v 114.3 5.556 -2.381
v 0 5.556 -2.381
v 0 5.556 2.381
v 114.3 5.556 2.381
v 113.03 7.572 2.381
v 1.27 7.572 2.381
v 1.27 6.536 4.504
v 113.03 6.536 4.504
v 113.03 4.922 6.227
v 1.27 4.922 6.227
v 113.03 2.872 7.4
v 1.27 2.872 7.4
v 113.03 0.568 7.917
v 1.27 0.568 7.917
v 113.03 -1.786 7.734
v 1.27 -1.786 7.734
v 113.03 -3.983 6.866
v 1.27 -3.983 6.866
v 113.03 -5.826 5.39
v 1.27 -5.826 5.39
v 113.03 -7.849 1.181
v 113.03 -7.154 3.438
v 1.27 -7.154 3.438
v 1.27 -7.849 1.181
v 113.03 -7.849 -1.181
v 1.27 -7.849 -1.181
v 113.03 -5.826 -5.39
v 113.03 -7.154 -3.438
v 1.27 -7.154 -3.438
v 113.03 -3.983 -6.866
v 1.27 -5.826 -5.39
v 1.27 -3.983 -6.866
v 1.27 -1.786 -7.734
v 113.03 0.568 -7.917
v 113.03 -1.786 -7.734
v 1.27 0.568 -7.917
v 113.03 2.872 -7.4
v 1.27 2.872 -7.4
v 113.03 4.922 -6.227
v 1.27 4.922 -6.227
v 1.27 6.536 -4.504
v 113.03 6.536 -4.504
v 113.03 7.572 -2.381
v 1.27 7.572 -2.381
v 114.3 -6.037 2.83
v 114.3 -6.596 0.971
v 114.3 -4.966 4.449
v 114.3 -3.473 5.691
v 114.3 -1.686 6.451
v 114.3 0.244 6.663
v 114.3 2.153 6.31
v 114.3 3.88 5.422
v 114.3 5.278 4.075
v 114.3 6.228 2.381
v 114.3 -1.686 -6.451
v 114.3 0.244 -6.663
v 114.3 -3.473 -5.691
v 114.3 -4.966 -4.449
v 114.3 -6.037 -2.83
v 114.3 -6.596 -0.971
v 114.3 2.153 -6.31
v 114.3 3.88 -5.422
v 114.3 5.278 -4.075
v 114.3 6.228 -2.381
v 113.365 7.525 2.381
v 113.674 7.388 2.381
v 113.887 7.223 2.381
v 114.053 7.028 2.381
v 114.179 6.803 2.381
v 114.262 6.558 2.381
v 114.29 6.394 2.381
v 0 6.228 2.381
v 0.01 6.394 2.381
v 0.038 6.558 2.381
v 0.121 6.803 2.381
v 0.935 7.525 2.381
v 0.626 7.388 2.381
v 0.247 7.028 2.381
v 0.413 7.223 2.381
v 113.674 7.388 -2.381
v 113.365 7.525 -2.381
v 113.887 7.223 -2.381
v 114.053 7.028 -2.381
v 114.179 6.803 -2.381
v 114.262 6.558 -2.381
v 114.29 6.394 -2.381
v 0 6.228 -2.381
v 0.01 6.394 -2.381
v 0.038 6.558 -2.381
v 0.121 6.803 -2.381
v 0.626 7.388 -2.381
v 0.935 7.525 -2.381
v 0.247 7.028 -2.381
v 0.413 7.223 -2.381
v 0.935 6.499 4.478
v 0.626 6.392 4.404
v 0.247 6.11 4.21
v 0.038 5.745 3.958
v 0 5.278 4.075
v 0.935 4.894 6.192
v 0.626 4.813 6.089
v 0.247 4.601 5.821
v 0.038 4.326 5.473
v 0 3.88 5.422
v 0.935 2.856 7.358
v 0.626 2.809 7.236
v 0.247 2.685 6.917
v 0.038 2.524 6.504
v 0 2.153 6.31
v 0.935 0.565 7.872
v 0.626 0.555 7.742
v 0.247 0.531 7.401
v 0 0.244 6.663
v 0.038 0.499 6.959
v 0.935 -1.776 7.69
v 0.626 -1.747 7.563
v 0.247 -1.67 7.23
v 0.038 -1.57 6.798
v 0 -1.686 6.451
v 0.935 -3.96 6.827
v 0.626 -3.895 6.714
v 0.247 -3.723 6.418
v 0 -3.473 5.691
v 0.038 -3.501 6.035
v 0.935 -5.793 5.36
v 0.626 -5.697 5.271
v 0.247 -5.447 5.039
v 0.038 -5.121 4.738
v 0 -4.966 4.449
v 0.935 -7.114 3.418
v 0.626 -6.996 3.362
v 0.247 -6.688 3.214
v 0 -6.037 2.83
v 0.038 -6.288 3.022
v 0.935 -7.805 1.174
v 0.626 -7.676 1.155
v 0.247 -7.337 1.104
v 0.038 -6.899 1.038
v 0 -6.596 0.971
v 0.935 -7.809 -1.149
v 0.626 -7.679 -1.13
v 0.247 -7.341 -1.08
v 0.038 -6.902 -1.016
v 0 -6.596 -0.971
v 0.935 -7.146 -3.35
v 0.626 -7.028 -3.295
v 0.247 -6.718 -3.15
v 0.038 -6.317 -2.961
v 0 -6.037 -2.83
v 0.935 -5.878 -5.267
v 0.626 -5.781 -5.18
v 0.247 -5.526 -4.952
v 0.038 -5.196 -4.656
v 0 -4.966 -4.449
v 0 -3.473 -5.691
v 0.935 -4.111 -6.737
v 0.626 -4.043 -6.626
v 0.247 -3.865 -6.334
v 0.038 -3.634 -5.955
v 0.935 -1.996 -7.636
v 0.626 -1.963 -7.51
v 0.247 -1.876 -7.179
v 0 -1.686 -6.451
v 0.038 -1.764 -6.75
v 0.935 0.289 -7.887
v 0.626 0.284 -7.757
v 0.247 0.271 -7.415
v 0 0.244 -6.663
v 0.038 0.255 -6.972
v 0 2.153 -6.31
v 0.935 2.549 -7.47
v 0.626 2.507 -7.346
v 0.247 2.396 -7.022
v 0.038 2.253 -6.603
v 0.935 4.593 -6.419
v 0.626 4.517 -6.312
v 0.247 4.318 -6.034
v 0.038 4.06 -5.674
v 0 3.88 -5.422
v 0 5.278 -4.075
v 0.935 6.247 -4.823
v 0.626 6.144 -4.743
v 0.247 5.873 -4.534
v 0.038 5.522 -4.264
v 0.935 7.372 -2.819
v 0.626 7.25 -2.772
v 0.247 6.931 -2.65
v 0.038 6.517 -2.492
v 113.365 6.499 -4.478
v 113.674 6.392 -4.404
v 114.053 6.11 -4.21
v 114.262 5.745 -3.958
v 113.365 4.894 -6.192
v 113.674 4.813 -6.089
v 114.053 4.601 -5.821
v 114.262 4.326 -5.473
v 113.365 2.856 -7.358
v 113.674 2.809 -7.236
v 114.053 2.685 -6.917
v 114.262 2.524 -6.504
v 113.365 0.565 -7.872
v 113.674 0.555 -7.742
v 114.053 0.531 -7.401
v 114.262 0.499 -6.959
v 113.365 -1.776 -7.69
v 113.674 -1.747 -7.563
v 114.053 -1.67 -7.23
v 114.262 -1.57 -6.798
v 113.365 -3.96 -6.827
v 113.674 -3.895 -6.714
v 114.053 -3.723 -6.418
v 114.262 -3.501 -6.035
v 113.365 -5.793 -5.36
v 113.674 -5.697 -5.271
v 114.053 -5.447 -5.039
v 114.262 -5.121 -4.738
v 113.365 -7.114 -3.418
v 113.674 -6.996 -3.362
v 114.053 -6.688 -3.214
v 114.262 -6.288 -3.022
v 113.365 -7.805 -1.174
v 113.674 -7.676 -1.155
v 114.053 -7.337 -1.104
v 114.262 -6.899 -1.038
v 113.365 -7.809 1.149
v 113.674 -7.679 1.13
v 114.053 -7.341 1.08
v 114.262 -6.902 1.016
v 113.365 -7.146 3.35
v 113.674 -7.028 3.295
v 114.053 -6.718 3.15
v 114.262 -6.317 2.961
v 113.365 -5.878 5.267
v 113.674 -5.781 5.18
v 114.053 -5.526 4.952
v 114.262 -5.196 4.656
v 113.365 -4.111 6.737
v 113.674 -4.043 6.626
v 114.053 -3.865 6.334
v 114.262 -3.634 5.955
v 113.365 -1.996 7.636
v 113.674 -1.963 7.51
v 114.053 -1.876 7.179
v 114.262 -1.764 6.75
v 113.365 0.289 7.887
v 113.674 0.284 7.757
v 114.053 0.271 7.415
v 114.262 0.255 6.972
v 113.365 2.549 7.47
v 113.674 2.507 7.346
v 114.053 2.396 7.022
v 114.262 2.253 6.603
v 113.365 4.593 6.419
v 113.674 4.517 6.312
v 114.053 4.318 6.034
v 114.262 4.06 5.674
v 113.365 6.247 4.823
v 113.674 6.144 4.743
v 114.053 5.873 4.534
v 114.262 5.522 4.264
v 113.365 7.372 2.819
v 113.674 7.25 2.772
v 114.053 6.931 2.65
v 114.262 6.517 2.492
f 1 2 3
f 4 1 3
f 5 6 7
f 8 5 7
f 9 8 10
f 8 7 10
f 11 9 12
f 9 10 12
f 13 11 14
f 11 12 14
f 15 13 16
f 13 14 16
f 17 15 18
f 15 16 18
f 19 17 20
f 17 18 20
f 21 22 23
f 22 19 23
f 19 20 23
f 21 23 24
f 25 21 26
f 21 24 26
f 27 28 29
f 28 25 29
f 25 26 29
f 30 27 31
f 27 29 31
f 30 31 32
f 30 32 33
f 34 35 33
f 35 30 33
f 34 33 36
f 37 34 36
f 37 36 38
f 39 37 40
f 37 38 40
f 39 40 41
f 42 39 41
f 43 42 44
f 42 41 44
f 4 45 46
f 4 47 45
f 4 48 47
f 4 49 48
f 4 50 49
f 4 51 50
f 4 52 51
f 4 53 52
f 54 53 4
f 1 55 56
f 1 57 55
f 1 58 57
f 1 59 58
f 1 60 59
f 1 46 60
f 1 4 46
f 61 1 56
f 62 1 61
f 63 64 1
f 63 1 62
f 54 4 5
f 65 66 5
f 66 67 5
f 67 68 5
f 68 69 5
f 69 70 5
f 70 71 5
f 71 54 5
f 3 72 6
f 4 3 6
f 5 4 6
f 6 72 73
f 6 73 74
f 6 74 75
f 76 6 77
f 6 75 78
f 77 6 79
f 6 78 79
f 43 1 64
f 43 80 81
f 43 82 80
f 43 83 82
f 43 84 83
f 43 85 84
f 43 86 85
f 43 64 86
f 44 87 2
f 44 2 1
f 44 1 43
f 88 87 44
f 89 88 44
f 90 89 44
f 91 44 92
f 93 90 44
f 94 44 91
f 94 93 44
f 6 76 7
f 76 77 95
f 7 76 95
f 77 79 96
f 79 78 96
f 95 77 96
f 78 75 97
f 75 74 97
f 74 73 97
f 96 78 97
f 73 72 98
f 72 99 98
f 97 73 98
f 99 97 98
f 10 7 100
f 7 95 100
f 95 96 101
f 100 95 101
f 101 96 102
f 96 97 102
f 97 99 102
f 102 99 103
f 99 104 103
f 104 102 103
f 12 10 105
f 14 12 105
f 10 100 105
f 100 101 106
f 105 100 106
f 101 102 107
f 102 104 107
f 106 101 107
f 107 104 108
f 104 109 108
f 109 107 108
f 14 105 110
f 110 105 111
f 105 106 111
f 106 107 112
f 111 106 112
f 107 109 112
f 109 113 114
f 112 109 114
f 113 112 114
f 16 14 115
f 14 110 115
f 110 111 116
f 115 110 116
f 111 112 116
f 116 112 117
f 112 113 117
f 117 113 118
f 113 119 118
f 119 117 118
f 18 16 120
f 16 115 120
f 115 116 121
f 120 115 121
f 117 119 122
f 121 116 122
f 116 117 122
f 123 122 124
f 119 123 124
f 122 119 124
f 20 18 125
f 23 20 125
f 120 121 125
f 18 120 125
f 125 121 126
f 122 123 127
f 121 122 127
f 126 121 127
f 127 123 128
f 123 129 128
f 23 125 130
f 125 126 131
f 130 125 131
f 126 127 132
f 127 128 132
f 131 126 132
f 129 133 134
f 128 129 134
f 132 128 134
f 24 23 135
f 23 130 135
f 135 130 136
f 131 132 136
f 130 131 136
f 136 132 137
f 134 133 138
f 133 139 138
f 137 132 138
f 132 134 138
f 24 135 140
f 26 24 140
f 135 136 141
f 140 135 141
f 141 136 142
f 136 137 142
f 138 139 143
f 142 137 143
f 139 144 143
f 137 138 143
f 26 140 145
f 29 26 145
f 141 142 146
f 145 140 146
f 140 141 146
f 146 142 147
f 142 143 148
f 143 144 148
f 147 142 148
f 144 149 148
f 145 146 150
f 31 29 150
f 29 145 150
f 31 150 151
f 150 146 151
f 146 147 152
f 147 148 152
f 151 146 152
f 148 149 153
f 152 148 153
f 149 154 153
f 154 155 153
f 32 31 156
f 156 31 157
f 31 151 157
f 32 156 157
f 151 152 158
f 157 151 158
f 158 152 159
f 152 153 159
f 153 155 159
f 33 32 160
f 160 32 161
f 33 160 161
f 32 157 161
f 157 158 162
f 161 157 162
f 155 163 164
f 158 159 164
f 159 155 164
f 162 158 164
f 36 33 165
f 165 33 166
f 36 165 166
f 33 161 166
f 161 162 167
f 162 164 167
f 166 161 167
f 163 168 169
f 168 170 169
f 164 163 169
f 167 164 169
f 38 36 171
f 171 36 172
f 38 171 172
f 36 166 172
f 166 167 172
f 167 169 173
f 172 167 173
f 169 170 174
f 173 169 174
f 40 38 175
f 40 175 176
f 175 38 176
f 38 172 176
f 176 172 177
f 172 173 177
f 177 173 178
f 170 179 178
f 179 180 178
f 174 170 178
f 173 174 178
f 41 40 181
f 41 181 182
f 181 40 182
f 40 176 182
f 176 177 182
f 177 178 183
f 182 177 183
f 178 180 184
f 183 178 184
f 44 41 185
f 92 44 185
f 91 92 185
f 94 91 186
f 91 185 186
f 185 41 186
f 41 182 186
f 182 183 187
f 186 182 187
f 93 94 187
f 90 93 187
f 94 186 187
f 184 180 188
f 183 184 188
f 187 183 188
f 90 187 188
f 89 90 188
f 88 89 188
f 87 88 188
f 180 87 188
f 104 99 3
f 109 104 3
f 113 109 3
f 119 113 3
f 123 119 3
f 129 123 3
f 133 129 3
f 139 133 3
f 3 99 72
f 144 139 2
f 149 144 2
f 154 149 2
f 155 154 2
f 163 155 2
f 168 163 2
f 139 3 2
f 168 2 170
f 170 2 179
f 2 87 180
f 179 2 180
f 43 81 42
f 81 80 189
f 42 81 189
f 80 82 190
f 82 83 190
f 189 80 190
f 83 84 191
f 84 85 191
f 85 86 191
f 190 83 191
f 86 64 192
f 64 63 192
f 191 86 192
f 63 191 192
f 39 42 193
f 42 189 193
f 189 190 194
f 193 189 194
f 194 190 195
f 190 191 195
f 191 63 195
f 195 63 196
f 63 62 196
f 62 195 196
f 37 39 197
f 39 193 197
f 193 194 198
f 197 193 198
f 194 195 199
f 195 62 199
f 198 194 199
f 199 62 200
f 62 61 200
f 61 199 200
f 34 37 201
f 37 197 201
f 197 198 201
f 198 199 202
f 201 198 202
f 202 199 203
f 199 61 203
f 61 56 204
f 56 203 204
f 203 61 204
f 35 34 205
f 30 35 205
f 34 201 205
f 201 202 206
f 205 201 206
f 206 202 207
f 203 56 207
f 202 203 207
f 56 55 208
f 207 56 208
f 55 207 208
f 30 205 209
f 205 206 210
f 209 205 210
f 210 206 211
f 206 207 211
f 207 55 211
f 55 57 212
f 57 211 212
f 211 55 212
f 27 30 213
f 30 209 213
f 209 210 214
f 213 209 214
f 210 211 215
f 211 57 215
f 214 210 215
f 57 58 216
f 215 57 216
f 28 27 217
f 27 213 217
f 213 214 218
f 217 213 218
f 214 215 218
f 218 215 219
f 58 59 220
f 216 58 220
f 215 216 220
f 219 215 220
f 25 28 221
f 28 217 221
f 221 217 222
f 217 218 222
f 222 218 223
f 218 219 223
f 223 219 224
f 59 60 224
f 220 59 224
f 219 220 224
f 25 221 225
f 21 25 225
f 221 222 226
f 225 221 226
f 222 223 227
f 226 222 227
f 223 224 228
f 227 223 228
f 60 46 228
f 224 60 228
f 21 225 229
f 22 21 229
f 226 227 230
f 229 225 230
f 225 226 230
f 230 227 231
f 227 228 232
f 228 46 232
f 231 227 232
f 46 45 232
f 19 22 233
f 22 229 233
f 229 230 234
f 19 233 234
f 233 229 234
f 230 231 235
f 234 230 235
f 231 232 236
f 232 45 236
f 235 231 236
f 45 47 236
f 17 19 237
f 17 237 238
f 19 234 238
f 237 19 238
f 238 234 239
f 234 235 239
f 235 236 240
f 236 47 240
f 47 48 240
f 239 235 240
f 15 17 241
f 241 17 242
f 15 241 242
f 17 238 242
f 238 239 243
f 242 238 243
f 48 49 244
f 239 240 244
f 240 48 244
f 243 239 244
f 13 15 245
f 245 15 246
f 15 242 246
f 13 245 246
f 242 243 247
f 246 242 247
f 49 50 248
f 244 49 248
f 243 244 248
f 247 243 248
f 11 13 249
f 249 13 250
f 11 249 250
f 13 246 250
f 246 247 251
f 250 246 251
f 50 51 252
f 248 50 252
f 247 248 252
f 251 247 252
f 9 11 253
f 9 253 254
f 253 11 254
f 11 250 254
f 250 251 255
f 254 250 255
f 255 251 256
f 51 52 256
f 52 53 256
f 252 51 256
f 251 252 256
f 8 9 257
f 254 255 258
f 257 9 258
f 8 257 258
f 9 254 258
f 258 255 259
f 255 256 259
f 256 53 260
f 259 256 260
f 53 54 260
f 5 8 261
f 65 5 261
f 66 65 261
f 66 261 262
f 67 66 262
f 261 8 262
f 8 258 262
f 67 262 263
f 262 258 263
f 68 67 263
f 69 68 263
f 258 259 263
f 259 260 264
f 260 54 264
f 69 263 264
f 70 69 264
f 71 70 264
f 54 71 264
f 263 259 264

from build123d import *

# Parameters (mm, degrees)
SKETCH1_R          = 7.9375
EXTRUDE1_DEPTH     = 114.3
SKETCH2_W          = 4.7625
SKETCH2_H          = 2.38125
CUT_EXTRUDE1_DEPTH = 115.3
FILLET1_R          = 1.27


with BuildPart() as part:
    # Sketch1 → Extrude1 (new body)
    with BuildSketch(Plane(origin=(0, 0, 0), x_dir=(0, 0, -1), z_dir=(1, 0, 0))):
        Circle(SKETCH1_R)
    extrude(amount=EXTRUDE1_DEPTH)

    # Sketch2 → Cut-Extrude1 (cut, through all)
    with BuildSketch(Plane.ZY):
        with Locations((0, 6.746875)):
            Rectangle(SKETCH2_W, SKETCH2_H)
    extrude(amount=-CUT_EXTRUDE1_DEPTH, mode=Mode.SUBTRACT)

    # Fillet1
    fillet1_edges = [part.edges().sort_by_distance(p)[0] for p in [
        (0, -7.9375, 0),
        (114.3, -7.9375, 0),
    ]]
    fillet(fillet1_edges, radius=FILLET1_R)


solid = part.part
